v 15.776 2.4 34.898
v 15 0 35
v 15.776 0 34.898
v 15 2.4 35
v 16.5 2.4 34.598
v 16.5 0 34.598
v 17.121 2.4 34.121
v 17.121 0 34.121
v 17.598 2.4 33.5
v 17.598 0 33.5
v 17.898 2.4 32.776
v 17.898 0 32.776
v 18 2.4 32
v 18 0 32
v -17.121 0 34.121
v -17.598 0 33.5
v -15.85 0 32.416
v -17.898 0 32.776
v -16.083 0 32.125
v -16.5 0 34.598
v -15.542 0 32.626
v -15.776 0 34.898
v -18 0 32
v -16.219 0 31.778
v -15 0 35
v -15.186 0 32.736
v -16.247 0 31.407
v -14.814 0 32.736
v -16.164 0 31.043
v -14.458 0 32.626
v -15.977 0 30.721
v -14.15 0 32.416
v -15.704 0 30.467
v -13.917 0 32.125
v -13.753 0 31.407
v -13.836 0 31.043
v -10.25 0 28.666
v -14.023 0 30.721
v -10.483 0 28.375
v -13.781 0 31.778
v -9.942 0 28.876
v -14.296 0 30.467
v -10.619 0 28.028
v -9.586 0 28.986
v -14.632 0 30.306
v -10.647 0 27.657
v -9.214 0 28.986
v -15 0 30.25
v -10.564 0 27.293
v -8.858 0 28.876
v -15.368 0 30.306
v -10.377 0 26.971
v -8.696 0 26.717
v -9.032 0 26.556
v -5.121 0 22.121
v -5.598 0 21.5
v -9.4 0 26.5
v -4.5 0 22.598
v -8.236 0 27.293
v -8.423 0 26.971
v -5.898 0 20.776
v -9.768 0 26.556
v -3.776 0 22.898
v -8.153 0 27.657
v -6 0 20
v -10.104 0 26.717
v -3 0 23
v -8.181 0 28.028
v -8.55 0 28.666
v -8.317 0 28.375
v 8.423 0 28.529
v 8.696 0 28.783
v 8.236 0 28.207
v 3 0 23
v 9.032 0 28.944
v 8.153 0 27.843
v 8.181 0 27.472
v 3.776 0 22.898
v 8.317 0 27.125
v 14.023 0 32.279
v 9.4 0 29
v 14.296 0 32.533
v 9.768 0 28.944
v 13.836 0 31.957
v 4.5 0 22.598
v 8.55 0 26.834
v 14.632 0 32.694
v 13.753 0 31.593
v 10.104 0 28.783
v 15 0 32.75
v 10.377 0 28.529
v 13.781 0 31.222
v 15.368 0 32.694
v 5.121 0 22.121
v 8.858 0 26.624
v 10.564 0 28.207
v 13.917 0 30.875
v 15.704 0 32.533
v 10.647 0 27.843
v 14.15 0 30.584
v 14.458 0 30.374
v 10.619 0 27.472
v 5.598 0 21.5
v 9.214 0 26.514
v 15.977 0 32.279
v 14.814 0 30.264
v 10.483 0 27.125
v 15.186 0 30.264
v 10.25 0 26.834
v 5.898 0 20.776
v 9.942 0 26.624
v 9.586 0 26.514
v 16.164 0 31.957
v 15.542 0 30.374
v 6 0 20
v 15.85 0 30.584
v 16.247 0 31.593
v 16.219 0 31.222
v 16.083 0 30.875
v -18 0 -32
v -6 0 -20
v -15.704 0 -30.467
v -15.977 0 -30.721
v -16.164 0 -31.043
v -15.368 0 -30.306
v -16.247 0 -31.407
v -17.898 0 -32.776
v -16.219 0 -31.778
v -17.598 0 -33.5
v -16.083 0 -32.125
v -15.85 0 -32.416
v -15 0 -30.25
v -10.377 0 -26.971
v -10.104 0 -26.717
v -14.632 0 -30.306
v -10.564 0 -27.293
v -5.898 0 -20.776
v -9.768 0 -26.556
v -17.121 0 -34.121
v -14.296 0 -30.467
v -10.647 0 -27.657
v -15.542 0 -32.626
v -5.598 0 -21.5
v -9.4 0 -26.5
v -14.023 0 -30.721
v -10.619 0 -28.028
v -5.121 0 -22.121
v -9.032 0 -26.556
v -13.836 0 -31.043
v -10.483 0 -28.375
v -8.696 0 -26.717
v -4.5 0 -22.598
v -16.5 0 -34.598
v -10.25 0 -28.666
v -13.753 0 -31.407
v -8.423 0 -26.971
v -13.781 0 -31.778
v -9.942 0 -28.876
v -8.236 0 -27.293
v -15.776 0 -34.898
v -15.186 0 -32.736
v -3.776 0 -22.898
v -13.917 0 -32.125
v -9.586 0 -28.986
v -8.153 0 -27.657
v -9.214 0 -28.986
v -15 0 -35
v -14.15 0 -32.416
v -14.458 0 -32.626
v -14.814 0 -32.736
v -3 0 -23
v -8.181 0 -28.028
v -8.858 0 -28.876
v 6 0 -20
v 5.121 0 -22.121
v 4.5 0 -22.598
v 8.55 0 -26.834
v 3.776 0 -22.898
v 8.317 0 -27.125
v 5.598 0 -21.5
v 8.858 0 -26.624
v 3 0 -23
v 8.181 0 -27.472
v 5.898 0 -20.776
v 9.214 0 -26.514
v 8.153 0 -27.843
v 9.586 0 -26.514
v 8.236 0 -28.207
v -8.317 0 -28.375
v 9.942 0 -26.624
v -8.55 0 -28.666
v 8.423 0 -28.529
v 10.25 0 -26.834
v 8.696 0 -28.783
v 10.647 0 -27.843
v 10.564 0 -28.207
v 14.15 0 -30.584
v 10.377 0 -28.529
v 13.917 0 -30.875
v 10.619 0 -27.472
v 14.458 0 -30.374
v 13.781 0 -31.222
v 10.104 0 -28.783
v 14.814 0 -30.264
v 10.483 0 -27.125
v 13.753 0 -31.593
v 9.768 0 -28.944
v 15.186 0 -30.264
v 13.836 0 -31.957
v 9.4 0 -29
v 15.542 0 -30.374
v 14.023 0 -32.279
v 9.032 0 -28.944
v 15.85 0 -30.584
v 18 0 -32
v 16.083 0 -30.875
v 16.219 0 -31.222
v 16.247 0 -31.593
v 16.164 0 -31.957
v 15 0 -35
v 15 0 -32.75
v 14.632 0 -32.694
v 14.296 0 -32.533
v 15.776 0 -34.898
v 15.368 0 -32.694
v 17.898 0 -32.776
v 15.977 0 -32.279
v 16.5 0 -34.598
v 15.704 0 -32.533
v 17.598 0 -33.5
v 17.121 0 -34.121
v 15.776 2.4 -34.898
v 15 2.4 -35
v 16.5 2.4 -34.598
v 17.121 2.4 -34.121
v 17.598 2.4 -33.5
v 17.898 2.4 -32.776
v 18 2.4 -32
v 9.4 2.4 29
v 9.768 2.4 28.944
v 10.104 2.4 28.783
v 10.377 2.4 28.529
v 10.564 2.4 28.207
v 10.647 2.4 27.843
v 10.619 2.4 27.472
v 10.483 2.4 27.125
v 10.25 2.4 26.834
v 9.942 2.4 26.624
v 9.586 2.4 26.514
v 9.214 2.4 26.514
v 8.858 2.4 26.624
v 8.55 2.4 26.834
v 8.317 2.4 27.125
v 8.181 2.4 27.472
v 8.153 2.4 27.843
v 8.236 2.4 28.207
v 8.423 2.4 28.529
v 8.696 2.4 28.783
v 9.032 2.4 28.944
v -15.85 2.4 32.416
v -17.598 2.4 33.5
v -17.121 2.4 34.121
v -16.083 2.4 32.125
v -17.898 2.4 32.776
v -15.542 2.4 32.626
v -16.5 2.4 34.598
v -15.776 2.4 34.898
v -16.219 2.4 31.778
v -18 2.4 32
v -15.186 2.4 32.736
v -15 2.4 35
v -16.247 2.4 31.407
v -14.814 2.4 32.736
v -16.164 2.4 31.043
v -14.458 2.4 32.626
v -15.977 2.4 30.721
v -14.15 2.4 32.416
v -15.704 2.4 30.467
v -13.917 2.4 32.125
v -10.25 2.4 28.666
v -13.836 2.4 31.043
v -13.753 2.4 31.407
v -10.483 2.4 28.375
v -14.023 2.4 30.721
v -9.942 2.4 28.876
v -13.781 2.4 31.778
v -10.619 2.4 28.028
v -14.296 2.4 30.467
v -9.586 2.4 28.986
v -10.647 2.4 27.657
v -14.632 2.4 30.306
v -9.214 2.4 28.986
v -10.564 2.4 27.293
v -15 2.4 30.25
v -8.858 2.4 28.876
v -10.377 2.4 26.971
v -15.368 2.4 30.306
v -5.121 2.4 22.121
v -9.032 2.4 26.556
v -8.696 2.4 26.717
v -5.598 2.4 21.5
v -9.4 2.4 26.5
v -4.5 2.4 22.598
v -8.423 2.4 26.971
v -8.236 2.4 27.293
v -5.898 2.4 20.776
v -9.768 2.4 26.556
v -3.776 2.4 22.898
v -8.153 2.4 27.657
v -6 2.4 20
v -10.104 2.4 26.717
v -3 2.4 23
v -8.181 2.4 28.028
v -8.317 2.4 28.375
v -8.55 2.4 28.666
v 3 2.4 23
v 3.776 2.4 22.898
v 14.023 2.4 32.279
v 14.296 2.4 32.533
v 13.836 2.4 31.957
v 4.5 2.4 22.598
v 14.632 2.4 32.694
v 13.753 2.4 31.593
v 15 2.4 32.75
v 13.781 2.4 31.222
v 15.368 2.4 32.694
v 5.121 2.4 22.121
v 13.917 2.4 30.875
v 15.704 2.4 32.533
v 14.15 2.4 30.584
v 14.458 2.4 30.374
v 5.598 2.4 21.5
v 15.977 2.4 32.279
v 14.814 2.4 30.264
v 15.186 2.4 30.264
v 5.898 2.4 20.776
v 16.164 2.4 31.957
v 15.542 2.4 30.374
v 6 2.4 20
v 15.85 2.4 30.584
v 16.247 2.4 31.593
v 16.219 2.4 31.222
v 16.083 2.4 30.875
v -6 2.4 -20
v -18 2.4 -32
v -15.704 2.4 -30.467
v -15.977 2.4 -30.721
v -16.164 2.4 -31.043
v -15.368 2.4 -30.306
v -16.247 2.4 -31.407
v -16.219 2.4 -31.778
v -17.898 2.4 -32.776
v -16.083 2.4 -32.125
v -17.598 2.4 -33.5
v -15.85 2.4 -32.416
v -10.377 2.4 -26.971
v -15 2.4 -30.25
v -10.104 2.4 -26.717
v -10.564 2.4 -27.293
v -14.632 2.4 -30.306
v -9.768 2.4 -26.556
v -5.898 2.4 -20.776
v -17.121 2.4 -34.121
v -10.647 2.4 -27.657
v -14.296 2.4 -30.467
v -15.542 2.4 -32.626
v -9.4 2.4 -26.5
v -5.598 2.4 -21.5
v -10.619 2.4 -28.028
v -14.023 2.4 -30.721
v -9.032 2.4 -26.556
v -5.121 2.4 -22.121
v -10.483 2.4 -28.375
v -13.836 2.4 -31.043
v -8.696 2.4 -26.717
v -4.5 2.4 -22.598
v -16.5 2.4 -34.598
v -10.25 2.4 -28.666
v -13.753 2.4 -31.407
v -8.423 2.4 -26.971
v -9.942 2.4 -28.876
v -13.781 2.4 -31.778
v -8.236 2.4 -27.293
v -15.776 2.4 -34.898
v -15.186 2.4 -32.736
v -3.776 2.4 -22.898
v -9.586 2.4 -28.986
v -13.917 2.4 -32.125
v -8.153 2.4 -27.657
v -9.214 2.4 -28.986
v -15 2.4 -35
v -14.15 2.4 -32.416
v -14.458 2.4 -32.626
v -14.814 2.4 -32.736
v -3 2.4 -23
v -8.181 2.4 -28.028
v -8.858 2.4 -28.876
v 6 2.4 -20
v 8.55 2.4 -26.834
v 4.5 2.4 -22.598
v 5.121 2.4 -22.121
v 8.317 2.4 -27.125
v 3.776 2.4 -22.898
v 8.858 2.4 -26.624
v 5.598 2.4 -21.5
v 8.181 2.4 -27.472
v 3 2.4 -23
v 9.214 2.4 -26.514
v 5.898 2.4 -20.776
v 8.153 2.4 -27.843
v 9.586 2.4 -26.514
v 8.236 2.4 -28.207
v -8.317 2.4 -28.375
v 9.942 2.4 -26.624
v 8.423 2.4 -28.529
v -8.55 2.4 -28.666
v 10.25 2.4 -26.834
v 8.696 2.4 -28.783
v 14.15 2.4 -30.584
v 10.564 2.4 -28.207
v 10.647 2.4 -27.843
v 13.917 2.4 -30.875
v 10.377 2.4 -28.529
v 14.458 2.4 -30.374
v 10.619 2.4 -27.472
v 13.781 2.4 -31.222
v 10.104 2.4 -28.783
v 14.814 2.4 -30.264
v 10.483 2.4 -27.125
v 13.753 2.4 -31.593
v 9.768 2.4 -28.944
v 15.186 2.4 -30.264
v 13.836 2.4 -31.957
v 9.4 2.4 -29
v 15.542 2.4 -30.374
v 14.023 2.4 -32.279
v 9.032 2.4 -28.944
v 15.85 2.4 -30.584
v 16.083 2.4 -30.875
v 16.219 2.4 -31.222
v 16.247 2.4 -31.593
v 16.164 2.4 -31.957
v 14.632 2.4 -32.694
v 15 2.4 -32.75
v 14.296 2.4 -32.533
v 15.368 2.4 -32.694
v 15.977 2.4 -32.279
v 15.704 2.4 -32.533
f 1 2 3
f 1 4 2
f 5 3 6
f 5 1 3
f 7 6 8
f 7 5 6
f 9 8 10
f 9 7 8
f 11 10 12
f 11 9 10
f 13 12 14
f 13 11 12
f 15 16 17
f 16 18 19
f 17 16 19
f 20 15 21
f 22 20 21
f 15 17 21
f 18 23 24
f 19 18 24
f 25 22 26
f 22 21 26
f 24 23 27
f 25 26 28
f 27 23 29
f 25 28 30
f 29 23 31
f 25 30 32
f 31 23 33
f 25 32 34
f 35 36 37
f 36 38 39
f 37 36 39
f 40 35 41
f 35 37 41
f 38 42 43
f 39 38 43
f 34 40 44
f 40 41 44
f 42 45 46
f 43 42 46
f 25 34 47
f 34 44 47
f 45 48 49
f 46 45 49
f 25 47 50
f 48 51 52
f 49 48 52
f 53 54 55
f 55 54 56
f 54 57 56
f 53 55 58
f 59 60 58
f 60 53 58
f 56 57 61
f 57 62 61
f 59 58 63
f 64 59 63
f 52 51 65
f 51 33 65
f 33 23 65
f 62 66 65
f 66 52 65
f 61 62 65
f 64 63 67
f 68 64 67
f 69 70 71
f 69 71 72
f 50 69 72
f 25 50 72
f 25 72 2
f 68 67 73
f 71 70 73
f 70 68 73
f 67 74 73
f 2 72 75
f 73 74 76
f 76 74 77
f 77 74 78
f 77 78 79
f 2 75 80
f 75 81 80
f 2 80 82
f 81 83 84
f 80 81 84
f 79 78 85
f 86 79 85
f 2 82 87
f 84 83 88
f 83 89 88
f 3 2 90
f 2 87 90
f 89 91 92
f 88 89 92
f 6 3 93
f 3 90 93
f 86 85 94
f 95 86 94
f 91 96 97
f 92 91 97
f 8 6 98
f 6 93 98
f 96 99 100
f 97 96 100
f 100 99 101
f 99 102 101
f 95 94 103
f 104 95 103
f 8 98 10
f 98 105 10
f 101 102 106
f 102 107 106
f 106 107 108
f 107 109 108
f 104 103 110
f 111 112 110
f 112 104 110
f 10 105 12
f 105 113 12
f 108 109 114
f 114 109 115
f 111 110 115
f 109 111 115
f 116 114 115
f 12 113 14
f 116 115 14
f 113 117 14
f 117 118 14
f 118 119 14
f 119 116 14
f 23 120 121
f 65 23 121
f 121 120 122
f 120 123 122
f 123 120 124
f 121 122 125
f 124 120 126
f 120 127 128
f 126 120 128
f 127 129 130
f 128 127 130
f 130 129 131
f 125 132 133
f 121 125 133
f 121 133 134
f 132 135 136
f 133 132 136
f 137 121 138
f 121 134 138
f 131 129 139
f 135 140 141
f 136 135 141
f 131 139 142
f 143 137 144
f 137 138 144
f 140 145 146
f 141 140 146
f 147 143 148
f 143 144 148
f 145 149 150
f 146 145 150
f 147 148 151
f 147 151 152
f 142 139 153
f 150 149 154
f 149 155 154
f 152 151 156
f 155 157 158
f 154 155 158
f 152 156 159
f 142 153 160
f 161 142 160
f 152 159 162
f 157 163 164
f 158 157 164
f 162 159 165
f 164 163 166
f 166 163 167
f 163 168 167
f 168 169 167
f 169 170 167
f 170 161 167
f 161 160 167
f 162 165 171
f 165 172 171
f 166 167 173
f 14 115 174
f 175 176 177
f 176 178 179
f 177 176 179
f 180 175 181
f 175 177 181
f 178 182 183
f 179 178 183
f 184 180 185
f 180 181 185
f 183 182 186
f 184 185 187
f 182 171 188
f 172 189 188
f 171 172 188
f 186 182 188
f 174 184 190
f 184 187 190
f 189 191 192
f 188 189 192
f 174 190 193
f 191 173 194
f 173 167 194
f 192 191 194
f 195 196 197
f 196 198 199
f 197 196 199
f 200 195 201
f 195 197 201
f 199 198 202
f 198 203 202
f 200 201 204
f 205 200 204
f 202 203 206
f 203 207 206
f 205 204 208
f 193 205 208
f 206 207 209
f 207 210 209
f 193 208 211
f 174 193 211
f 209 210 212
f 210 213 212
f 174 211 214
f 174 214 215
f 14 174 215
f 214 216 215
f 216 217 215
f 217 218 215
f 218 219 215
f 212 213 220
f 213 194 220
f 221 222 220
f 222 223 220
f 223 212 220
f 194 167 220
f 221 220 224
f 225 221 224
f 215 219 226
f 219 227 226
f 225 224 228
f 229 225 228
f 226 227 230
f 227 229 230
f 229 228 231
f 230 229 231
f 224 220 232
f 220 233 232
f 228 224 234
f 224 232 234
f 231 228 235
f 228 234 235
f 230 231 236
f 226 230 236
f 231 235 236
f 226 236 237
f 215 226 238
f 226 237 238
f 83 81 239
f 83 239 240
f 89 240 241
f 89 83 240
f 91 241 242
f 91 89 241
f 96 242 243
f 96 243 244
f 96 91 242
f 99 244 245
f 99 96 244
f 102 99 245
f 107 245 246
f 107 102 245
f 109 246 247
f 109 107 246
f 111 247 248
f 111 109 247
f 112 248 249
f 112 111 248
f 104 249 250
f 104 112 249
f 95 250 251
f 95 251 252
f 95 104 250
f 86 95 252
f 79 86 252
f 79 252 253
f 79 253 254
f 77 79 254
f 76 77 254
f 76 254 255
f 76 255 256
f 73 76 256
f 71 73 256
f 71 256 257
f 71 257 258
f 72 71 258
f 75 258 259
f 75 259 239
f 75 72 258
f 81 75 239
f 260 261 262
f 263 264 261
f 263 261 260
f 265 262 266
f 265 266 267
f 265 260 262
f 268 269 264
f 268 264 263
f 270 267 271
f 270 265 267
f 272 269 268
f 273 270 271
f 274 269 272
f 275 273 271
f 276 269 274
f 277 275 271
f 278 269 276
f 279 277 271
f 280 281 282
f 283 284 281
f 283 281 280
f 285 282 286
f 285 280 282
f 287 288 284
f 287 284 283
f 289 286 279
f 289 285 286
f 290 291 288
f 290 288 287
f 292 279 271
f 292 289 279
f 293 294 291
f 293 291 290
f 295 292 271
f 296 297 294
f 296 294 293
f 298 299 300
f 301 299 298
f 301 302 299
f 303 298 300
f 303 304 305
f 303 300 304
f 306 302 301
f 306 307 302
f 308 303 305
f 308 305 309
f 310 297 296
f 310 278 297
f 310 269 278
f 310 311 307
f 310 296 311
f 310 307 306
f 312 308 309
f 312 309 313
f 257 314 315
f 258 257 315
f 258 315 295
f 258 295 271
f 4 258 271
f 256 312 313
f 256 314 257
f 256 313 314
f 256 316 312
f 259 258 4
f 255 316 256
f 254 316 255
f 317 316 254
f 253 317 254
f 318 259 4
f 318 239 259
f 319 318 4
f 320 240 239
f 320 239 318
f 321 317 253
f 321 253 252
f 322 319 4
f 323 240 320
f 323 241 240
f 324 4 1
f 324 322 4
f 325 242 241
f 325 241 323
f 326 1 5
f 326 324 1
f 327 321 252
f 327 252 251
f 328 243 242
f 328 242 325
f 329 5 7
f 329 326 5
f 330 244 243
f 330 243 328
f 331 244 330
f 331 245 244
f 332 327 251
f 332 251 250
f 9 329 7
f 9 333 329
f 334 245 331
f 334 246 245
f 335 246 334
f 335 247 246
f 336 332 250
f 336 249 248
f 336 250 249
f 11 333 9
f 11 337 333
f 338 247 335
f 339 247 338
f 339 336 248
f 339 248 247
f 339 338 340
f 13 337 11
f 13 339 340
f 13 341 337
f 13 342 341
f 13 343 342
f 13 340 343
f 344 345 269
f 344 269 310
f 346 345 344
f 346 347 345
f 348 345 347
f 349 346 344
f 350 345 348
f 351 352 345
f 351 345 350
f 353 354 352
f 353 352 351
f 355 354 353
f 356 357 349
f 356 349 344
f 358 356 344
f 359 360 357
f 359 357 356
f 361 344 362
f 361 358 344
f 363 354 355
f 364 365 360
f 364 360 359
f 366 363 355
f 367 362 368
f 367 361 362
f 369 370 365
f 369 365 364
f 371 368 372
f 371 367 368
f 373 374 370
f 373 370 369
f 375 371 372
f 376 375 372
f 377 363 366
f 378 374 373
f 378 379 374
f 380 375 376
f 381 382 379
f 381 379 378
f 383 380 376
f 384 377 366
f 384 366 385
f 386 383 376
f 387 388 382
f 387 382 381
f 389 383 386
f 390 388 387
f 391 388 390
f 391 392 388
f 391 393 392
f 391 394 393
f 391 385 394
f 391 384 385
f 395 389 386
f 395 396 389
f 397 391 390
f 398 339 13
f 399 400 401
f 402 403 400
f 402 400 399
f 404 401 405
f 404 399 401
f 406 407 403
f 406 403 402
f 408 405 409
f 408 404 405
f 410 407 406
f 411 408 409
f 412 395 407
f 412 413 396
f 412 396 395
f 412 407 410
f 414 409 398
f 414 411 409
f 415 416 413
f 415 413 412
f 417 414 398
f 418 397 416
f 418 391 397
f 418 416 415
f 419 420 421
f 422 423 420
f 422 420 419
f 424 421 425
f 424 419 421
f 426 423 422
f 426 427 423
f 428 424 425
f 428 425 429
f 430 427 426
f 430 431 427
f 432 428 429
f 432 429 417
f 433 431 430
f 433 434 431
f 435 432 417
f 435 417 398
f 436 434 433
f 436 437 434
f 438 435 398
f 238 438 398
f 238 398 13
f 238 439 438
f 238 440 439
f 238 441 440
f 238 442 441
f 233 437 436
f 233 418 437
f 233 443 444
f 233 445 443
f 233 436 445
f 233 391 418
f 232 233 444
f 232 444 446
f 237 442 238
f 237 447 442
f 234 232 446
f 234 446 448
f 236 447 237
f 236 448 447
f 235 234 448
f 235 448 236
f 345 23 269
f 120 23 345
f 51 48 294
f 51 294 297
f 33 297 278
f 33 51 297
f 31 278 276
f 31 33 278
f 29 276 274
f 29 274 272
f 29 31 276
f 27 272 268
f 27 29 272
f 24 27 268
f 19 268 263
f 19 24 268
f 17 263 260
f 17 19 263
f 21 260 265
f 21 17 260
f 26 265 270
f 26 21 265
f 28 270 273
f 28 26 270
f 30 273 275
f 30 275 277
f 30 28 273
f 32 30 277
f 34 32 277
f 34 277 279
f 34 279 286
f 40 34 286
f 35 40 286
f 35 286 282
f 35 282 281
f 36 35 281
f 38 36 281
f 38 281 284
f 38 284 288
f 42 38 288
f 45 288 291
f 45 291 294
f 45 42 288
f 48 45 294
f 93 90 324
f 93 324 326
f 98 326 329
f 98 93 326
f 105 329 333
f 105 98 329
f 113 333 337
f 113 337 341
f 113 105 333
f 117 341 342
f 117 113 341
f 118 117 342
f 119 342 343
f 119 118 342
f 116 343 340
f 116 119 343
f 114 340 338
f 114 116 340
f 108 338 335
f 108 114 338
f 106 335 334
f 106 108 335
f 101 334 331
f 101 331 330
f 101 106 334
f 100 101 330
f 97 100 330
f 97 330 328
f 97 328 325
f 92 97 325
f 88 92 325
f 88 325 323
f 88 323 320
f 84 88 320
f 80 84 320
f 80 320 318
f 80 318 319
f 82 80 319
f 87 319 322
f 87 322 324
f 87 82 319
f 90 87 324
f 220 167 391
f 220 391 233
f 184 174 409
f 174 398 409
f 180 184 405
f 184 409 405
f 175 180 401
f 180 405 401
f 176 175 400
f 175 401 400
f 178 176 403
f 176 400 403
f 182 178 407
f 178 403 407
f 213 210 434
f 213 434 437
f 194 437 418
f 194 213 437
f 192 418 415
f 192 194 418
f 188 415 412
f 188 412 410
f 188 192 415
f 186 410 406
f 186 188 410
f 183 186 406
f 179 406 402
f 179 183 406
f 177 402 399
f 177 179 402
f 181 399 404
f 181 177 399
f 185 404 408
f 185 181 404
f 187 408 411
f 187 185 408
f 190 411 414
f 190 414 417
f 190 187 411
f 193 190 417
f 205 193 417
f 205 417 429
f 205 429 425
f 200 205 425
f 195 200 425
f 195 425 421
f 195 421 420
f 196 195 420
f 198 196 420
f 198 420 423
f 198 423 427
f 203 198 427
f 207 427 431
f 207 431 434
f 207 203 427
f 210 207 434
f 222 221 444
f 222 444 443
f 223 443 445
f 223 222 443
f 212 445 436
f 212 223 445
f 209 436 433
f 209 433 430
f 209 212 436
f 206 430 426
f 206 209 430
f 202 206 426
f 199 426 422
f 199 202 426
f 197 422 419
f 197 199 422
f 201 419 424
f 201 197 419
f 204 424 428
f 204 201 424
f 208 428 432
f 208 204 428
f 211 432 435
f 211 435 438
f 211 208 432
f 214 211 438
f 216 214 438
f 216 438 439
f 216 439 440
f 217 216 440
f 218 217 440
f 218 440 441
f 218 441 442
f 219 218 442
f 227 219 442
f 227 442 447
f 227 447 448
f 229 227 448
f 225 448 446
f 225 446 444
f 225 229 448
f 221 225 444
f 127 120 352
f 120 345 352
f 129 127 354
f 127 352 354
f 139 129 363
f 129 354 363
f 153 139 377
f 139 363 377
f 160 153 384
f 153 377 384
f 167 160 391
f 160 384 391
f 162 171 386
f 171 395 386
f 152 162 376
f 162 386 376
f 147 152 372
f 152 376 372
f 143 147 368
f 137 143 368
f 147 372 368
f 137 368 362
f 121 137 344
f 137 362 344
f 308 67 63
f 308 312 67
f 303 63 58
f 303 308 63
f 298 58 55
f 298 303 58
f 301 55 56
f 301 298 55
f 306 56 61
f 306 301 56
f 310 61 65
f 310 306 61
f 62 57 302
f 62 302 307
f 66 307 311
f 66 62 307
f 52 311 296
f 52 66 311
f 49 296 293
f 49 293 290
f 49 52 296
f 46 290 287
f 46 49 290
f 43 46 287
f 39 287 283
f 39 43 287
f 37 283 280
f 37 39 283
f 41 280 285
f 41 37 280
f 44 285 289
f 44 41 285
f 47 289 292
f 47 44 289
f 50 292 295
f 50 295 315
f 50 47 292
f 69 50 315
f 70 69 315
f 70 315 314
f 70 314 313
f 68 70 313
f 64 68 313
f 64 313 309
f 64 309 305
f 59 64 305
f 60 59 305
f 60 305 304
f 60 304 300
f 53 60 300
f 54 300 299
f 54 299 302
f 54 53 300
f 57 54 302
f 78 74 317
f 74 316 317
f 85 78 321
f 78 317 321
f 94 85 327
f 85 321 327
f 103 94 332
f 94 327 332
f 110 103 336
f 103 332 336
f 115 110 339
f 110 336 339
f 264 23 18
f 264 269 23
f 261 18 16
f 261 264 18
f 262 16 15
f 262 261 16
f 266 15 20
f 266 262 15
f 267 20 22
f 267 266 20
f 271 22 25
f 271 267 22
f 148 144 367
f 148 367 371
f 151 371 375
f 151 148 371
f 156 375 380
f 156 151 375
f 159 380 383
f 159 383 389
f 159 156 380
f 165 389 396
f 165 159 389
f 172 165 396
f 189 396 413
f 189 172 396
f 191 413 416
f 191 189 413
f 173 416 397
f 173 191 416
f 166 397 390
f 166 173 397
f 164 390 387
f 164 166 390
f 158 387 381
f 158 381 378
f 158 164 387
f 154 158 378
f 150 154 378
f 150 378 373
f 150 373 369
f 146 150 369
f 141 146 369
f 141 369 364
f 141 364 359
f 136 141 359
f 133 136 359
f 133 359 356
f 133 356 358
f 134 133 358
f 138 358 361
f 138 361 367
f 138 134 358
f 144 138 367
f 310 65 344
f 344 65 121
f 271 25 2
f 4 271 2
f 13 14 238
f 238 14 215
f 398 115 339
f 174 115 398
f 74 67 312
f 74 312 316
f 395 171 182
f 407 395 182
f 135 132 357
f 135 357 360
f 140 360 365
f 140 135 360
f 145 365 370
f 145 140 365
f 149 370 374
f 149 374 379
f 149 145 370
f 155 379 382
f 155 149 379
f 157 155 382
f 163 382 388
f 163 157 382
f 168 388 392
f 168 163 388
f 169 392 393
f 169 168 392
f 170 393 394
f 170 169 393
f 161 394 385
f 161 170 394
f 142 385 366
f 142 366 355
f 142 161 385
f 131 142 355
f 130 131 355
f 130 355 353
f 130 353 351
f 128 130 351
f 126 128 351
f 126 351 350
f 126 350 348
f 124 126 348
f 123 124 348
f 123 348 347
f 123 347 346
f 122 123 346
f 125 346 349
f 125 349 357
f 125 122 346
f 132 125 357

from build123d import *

# Parameters (mm, degrees)
SKETCH_1_W      = 36
SKETCH_1_H      = 70
SKETCH_1_R      = 1.25
SKETCH_1_W_2    = 12
SKETCH_1_H_2    = 46
EXTRUDE_1_DEPTH = 2.4
FILLET_1_R      = 3


with BuildPart() as part:
    # 草图1 → 凸台-拉伸1 (new body)
    with BuildSketch(Plane(origin=(0, 0, 0), x_dir=(1, 0, 0), z_dir=(0, 1, 0))):
        Rectangle(SKETCH_1_W, SKETCH_1_H)
        with Locations(Location((-9.4, 27.75, 0), (0, 0, 270))):
            Circle(SKETCH_1_R, mode=Mode.SUBTRACT)
        with Locations(Location((9.4, 27.75, 0), (0, 0, 90))):
            Circle(SKETCH_1_R, mode=Mode.SUBTRACT)
        with Locations(Location((9.4, -27.75, 0), (0, 0, 270))):
            Circle(SKETCH_1_R, mode=Mode.SUBTRACT)
        with Locations(Location((-9.4, -27.75, 0), (0, 0, 90))):
            Circle(SKETCH_1_R, mode=Mode.SUBTRACT)
        with Locations(Location((-15, 31.5, 0), (0, 0, 270))):
            Circle(SKETCH_1_R, mode=Mode.SUBTRACT)
        with Locations(Location((15, 31.5, 0), (0, 0, 90))):
            Circle(SKETCH_1_R, mode=Mode.SUBTRACT)
        with Locations(Location((-15, -31.5, 0), (0, 0, 90))):
            Circle(SKETCH_1_R, mode=Mode.SUBTRACT)
        with Locations(Location((15, -31.5, 0), (0, 0, 270))):
            Circle(SKETCH_1_R, mode=Mode.SUBTRACT)
        Rectangle(SKETCH_1_W_2, SKETCH_1_H_2, mode=Mode.SUBTRACT)
    extrude(amount=EXTRUDE_1_DEPTH)

    # 圆角1
    fillet_1_edges = [part.edges().sort_by_distance(p)[0] for p in [
        (-6, 1.2, 23),
        (6, 1.2, 23),
        (6, 1.2, -23),
        (-6, 1.2, -23),
        (18, 1.2, 35),
        (-18, 1.2, 35),
        (-18, 1.2, -35),
        (18, 1.2, -35),
    ]]
    fillet(fillet_1_edges, radius=FILLET_1_R)


solid = part.part
